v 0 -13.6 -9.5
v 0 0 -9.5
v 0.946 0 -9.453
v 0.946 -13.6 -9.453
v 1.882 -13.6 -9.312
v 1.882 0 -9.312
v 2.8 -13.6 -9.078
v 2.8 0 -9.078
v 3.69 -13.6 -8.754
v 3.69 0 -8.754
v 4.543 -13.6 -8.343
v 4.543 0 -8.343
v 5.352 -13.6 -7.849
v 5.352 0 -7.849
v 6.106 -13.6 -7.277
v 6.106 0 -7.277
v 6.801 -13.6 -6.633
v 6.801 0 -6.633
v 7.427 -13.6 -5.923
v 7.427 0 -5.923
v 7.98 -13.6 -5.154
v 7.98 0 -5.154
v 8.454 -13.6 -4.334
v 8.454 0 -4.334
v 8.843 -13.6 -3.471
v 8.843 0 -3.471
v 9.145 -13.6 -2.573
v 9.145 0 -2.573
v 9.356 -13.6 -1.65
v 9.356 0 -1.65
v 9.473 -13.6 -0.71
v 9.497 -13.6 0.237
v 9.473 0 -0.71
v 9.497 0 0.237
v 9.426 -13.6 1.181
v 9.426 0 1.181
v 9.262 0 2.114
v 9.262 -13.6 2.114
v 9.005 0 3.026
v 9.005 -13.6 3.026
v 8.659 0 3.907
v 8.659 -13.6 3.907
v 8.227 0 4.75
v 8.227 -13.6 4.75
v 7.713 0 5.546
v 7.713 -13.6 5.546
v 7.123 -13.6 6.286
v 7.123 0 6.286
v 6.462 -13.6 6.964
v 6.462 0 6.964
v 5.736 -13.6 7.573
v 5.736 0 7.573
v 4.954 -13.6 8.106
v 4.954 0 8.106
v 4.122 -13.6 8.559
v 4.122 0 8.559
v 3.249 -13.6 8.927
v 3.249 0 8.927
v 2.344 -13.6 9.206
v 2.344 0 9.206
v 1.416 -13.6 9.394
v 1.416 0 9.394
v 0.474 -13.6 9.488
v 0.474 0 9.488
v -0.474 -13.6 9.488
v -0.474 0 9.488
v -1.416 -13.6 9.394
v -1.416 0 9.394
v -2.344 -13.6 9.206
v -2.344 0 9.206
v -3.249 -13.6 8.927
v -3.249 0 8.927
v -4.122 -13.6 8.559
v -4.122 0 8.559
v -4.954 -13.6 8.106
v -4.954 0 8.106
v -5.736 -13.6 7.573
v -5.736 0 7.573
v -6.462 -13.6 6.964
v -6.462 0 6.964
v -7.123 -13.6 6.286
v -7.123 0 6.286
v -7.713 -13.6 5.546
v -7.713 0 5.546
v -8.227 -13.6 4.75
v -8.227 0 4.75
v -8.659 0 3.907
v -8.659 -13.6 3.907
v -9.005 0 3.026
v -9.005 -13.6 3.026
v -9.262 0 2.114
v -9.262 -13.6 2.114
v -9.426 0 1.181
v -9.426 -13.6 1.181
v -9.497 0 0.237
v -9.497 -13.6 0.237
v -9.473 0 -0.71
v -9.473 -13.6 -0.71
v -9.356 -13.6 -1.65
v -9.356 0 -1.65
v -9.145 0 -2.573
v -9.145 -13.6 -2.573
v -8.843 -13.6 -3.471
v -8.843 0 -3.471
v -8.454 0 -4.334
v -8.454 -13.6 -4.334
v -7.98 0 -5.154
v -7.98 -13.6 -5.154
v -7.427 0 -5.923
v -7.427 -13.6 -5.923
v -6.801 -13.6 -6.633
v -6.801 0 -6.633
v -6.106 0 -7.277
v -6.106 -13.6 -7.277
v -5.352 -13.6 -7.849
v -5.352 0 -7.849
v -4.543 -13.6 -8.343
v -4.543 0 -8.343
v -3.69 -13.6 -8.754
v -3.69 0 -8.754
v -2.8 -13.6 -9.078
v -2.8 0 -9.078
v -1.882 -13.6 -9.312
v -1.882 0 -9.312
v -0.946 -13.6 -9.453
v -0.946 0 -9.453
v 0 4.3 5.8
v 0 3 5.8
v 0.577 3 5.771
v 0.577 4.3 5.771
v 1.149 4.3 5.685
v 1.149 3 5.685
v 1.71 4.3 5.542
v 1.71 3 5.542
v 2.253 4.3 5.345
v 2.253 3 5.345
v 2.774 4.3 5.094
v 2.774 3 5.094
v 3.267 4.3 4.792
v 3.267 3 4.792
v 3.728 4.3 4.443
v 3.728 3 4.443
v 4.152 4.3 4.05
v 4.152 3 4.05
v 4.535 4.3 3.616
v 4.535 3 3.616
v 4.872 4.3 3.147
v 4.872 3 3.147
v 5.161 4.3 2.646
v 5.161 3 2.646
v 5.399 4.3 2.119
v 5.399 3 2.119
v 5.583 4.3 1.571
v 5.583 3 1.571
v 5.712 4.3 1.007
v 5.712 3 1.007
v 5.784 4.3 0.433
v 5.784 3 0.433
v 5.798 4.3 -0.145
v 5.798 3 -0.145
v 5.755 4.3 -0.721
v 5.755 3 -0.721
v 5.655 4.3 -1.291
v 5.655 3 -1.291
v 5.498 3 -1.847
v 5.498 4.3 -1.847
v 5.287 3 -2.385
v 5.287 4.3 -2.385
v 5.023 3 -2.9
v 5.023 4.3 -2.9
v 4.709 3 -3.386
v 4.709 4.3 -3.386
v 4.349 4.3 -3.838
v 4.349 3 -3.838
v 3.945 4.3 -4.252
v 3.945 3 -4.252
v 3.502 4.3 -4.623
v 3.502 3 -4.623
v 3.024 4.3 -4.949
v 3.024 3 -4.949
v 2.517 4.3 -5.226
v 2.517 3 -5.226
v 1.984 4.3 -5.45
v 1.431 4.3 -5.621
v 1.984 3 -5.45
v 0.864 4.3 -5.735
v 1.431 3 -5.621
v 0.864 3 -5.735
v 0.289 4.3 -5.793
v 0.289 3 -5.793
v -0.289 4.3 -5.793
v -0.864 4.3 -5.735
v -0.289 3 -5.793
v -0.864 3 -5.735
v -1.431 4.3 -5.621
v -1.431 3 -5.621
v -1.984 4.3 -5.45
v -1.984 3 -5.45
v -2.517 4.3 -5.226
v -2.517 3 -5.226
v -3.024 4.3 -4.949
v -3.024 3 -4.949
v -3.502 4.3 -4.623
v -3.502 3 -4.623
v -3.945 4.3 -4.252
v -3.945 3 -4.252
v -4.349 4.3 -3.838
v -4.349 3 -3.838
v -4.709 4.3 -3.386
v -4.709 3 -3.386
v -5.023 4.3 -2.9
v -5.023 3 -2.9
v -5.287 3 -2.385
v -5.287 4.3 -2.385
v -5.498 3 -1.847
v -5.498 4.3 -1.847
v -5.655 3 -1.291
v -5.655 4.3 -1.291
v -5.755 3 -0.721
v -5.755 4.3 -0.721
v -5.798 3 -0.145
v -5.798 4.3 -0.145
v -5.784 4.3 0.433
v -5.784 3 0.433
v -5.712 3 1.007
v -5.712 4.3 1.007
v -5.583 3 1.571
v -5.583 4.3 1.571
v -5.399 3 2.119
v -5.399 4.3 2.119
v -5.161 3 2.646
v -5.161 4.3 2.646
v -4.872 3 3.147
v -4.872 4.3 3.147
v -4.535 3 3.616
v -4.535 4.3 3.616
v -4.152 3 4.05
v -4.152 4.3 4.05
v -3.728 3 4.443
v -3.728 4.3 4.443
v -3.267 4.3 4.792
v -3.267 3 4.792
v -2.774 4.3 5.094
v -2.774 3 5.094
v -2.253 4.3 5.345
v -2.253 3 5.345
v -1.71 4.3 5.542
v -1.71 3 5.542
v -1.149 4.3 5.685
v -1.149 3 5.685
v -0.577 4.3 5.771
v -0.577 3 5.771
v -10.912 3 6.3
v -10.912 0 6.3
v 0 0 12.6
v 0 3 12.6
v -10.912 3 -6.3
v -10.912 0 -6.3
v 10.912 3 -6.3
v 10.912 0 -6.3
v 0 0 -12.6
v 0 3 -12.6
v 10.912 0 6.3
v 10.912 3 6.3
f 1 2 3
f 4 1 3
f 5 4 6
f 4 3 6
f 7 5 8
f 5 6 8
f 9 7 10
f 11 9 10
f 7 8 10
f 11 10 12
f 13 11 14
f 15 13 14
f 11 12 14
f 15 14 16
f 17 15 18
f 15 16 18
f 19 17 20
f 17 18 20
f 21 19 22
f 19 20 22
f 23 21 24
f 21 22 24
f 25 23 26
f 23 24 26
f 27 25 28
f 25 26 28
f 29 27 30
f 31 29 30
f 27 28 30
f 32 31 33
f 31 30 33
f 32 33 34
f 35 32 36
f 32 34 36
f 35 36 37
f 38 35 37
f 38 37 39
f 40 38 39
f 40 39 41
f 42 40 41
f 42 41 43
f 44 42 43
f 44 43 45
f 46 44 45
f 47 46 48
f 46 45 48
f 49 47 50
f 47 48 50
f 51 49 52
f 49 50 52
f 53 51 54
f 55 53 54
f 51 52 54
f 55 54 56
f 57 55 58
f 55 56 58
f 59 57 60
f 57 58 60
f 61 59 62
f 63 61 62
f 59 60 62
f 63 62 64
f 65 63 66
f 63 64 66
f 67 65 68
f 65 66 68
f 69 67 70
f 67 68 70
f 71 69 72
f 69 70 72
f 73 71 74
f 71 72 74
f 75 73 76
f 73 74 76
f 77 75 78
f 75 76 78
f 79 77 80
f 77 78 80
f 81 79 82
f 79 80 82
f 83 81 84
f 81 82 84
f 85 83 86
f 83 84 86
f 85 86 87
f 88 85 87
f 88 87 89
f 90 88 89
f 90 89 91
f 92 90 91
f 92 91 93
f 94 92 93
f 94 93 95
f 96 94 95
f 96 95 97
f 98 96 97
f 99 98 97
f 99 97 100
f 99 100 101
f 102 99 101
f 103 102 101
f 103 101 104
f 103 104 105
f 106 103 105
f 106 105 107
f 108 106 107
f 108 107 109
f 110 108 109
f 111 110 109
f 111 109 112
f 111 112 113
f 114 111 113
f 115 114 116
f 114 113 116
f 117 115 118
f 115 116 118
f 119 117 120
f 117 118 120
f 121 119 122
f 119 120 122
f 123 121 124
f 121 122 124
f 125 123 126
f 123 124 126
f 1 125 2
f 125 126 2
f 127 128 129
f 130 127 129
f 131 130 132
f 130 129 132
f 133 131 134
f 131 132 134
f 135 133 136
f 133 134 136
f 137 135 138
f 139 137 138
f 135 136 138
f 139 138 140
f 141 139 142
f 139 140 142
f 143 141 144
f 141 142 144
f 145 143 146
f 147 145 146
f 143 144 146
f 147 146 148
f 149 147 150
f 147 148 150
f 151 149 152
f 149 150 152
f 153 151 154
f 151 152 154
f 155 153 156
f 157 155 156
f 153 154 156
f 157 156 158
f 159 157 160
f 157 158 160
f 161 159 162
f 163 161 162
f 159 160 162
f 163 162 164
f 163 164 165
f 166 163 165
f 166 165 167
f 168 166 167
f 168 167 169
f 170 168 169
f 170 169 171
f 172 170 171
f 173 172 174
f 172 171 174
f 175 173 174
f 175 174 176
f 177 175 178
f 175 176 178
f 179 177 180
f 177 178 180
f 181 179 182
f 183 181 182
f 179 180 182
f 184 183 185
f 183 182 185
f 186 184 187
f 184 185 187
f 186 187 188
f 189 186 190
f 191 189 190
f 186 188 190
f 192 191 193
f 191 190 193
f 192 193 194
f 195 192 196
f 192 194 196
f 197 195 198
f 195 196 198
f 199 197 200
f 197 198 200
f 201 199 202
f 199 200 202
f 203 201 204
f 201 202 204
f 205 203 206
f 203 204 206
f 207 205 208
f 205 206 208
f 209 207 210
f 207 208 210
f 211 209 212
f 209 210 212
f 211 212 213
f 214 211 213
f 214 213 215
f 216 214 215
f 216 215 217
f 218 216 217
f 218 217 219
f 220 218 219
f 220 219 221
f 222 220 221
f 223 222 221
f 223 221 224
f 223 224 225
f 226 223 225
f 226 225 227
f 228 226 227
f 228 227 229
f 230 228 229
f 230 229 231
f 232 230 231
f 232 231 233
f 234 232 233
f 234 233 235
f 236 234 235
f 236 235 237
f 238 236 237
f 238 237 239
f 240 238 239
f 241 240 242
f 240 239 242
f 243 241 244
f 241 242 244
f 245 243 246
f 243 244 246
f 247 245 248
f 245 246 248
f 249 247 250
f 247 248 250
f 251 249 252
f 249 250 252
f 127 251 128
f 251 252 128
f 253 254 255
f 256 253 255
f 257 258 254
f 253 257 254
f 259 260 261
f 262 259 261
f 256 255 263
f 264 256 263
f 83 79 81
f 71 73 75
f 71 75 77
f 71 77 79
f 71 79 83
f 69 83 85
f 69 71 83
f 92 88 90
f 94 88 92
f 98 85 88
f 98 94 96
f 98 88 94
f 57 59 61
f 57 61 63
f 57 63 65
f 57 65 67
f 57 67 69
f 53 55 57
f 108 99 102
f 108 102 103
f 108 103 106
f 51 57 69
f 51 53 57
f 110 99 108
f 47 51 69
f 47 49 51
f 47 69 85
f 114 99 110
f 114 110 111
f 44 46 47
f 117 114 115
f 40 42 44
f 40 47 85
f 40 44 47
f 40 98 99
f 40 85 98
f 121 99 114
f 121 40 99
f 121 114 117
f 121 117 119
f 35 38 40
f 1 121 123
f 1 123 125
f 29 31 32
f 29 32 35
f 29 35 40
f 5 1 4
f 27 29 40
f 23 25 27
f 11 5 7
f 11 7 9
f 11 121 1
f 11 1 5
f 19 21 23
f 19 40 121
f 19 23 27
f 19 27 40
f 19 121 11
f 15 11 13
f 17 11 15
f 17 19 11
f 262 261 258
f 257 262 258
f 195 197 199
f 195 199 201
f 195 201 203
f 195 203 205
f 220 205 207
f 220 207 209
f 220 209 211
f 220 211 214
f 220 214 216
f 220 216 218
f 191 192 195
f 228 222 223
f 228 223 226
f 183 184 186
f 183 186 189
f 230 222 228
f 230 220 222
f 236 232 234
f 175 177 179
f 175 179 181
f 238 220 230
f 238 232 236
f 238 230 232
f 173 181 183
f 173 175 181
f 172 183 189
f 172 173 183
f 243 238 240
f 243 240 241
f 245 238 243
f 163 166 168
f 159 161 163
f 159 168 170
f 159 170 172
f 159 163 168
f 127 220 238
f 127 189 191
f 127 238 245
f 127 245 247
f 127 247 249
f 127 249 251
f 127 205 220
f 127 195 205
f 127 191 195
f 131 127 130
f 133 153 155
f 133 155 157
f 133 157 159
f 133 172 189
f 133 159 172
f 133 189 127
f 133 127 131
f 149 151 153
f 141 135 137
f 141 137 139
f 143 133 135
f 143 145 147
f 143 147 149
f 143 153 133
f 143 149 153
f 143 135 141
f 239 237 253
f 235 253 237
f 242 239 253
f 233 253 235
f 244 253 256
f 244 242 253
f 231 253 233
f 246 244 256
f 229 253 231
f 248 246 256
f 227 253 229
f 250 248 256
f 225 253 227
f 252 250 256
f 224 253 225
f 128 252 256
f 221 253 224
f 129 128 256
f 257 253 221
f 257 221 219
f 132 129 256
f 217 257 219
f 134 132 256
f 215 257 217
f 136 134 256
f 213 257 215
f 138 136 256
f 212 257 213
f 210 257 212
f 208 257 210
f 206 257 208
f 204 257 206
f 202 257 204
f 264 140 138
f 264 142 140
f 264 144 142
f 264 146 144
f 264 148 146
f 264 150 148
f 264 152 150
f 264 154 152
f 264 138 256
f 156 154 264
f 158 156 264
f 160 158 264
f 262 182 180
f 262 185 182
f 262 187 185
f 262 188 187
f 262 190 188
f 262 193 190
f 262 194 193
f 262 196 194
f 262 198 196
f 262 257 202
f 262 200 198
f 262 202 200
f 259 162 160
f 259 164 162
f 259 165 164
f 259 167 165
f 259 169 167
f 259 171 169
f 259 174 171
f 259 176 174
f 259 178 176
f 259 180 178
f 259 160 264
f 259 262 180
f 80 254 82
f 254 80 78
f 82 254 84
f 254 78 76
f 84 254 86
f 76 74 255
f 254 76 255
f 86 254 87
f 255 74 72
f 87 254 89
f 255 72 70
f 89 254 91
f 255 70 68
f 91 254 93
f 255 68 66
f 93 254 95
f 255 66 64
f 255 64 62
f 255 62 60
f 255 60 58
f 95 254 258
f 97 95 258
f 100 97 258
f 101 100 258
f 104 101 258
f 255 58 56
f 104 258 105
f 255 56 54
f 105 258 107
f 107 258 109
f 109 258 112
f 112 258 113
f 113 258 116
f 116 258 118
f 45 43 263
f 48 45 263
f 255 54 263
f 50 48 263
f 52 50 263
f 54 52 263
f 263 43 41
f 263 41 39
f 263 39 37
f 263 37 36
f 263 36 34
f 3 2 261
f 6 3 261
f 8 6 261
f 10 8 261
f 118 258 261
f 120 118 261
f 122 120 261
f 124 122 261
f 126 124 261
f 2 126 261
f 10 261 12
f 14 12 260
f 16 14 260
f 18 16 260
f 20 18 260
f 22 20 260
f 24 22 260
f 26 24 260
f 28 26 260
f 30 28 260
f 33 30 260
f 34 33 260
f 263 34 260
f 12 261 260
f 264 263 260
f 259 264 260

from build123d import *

# Parameters (mm, degrees)
EXTRUDE_1_DEPTH = 3
SKETCH_2_R      = 9.5
EXTRUDE_2_DEPTH = 13.6
SKETCH_3_R      = 5.8
EXTRUDE_3_DEPTH = 1.3


with BuildPart() as part:
    # 草图1 → 凸台-拉伸1 (new body)
    with BuildSketch(Plane(origin=(0, 0, 0), x_dir=(1, 0, 0), z_dir=(0, 1, 0))):
        Polygon((0, 12.6), (-10.911920088, 6.3), (-10.911920088, -6.3), (0, -12.6), (10.911920088, -6.3), (10.911920088, 6.3), align=None)
    extrude(amount=EXTRUDE_1_DEPTH)

    # 草图2 → 凸台-拉伸2 (add)
    with BuildSketch(Plane.XZ):
        with Locations(Location((0, 0, 0), (0, 0, 270))):
            Circle(SKETCH_2_R)
    extrude(amount=EXTRUDE_2_DEPTH)

    # 草图3 → 凸台-拉伸3 (add)
    with BuildSketch(Plane(origin=(0, 3, 0), x_dir=(1, 0, 0), z_dir=(0, 1, 0))):
        with Locations(Location((0, 0, 0), (0, 0, 270))):
            Circle(SKETCH_3_R)
    extrude(amount=EXTRUDE_3_DEPTH)


solid = part.part
